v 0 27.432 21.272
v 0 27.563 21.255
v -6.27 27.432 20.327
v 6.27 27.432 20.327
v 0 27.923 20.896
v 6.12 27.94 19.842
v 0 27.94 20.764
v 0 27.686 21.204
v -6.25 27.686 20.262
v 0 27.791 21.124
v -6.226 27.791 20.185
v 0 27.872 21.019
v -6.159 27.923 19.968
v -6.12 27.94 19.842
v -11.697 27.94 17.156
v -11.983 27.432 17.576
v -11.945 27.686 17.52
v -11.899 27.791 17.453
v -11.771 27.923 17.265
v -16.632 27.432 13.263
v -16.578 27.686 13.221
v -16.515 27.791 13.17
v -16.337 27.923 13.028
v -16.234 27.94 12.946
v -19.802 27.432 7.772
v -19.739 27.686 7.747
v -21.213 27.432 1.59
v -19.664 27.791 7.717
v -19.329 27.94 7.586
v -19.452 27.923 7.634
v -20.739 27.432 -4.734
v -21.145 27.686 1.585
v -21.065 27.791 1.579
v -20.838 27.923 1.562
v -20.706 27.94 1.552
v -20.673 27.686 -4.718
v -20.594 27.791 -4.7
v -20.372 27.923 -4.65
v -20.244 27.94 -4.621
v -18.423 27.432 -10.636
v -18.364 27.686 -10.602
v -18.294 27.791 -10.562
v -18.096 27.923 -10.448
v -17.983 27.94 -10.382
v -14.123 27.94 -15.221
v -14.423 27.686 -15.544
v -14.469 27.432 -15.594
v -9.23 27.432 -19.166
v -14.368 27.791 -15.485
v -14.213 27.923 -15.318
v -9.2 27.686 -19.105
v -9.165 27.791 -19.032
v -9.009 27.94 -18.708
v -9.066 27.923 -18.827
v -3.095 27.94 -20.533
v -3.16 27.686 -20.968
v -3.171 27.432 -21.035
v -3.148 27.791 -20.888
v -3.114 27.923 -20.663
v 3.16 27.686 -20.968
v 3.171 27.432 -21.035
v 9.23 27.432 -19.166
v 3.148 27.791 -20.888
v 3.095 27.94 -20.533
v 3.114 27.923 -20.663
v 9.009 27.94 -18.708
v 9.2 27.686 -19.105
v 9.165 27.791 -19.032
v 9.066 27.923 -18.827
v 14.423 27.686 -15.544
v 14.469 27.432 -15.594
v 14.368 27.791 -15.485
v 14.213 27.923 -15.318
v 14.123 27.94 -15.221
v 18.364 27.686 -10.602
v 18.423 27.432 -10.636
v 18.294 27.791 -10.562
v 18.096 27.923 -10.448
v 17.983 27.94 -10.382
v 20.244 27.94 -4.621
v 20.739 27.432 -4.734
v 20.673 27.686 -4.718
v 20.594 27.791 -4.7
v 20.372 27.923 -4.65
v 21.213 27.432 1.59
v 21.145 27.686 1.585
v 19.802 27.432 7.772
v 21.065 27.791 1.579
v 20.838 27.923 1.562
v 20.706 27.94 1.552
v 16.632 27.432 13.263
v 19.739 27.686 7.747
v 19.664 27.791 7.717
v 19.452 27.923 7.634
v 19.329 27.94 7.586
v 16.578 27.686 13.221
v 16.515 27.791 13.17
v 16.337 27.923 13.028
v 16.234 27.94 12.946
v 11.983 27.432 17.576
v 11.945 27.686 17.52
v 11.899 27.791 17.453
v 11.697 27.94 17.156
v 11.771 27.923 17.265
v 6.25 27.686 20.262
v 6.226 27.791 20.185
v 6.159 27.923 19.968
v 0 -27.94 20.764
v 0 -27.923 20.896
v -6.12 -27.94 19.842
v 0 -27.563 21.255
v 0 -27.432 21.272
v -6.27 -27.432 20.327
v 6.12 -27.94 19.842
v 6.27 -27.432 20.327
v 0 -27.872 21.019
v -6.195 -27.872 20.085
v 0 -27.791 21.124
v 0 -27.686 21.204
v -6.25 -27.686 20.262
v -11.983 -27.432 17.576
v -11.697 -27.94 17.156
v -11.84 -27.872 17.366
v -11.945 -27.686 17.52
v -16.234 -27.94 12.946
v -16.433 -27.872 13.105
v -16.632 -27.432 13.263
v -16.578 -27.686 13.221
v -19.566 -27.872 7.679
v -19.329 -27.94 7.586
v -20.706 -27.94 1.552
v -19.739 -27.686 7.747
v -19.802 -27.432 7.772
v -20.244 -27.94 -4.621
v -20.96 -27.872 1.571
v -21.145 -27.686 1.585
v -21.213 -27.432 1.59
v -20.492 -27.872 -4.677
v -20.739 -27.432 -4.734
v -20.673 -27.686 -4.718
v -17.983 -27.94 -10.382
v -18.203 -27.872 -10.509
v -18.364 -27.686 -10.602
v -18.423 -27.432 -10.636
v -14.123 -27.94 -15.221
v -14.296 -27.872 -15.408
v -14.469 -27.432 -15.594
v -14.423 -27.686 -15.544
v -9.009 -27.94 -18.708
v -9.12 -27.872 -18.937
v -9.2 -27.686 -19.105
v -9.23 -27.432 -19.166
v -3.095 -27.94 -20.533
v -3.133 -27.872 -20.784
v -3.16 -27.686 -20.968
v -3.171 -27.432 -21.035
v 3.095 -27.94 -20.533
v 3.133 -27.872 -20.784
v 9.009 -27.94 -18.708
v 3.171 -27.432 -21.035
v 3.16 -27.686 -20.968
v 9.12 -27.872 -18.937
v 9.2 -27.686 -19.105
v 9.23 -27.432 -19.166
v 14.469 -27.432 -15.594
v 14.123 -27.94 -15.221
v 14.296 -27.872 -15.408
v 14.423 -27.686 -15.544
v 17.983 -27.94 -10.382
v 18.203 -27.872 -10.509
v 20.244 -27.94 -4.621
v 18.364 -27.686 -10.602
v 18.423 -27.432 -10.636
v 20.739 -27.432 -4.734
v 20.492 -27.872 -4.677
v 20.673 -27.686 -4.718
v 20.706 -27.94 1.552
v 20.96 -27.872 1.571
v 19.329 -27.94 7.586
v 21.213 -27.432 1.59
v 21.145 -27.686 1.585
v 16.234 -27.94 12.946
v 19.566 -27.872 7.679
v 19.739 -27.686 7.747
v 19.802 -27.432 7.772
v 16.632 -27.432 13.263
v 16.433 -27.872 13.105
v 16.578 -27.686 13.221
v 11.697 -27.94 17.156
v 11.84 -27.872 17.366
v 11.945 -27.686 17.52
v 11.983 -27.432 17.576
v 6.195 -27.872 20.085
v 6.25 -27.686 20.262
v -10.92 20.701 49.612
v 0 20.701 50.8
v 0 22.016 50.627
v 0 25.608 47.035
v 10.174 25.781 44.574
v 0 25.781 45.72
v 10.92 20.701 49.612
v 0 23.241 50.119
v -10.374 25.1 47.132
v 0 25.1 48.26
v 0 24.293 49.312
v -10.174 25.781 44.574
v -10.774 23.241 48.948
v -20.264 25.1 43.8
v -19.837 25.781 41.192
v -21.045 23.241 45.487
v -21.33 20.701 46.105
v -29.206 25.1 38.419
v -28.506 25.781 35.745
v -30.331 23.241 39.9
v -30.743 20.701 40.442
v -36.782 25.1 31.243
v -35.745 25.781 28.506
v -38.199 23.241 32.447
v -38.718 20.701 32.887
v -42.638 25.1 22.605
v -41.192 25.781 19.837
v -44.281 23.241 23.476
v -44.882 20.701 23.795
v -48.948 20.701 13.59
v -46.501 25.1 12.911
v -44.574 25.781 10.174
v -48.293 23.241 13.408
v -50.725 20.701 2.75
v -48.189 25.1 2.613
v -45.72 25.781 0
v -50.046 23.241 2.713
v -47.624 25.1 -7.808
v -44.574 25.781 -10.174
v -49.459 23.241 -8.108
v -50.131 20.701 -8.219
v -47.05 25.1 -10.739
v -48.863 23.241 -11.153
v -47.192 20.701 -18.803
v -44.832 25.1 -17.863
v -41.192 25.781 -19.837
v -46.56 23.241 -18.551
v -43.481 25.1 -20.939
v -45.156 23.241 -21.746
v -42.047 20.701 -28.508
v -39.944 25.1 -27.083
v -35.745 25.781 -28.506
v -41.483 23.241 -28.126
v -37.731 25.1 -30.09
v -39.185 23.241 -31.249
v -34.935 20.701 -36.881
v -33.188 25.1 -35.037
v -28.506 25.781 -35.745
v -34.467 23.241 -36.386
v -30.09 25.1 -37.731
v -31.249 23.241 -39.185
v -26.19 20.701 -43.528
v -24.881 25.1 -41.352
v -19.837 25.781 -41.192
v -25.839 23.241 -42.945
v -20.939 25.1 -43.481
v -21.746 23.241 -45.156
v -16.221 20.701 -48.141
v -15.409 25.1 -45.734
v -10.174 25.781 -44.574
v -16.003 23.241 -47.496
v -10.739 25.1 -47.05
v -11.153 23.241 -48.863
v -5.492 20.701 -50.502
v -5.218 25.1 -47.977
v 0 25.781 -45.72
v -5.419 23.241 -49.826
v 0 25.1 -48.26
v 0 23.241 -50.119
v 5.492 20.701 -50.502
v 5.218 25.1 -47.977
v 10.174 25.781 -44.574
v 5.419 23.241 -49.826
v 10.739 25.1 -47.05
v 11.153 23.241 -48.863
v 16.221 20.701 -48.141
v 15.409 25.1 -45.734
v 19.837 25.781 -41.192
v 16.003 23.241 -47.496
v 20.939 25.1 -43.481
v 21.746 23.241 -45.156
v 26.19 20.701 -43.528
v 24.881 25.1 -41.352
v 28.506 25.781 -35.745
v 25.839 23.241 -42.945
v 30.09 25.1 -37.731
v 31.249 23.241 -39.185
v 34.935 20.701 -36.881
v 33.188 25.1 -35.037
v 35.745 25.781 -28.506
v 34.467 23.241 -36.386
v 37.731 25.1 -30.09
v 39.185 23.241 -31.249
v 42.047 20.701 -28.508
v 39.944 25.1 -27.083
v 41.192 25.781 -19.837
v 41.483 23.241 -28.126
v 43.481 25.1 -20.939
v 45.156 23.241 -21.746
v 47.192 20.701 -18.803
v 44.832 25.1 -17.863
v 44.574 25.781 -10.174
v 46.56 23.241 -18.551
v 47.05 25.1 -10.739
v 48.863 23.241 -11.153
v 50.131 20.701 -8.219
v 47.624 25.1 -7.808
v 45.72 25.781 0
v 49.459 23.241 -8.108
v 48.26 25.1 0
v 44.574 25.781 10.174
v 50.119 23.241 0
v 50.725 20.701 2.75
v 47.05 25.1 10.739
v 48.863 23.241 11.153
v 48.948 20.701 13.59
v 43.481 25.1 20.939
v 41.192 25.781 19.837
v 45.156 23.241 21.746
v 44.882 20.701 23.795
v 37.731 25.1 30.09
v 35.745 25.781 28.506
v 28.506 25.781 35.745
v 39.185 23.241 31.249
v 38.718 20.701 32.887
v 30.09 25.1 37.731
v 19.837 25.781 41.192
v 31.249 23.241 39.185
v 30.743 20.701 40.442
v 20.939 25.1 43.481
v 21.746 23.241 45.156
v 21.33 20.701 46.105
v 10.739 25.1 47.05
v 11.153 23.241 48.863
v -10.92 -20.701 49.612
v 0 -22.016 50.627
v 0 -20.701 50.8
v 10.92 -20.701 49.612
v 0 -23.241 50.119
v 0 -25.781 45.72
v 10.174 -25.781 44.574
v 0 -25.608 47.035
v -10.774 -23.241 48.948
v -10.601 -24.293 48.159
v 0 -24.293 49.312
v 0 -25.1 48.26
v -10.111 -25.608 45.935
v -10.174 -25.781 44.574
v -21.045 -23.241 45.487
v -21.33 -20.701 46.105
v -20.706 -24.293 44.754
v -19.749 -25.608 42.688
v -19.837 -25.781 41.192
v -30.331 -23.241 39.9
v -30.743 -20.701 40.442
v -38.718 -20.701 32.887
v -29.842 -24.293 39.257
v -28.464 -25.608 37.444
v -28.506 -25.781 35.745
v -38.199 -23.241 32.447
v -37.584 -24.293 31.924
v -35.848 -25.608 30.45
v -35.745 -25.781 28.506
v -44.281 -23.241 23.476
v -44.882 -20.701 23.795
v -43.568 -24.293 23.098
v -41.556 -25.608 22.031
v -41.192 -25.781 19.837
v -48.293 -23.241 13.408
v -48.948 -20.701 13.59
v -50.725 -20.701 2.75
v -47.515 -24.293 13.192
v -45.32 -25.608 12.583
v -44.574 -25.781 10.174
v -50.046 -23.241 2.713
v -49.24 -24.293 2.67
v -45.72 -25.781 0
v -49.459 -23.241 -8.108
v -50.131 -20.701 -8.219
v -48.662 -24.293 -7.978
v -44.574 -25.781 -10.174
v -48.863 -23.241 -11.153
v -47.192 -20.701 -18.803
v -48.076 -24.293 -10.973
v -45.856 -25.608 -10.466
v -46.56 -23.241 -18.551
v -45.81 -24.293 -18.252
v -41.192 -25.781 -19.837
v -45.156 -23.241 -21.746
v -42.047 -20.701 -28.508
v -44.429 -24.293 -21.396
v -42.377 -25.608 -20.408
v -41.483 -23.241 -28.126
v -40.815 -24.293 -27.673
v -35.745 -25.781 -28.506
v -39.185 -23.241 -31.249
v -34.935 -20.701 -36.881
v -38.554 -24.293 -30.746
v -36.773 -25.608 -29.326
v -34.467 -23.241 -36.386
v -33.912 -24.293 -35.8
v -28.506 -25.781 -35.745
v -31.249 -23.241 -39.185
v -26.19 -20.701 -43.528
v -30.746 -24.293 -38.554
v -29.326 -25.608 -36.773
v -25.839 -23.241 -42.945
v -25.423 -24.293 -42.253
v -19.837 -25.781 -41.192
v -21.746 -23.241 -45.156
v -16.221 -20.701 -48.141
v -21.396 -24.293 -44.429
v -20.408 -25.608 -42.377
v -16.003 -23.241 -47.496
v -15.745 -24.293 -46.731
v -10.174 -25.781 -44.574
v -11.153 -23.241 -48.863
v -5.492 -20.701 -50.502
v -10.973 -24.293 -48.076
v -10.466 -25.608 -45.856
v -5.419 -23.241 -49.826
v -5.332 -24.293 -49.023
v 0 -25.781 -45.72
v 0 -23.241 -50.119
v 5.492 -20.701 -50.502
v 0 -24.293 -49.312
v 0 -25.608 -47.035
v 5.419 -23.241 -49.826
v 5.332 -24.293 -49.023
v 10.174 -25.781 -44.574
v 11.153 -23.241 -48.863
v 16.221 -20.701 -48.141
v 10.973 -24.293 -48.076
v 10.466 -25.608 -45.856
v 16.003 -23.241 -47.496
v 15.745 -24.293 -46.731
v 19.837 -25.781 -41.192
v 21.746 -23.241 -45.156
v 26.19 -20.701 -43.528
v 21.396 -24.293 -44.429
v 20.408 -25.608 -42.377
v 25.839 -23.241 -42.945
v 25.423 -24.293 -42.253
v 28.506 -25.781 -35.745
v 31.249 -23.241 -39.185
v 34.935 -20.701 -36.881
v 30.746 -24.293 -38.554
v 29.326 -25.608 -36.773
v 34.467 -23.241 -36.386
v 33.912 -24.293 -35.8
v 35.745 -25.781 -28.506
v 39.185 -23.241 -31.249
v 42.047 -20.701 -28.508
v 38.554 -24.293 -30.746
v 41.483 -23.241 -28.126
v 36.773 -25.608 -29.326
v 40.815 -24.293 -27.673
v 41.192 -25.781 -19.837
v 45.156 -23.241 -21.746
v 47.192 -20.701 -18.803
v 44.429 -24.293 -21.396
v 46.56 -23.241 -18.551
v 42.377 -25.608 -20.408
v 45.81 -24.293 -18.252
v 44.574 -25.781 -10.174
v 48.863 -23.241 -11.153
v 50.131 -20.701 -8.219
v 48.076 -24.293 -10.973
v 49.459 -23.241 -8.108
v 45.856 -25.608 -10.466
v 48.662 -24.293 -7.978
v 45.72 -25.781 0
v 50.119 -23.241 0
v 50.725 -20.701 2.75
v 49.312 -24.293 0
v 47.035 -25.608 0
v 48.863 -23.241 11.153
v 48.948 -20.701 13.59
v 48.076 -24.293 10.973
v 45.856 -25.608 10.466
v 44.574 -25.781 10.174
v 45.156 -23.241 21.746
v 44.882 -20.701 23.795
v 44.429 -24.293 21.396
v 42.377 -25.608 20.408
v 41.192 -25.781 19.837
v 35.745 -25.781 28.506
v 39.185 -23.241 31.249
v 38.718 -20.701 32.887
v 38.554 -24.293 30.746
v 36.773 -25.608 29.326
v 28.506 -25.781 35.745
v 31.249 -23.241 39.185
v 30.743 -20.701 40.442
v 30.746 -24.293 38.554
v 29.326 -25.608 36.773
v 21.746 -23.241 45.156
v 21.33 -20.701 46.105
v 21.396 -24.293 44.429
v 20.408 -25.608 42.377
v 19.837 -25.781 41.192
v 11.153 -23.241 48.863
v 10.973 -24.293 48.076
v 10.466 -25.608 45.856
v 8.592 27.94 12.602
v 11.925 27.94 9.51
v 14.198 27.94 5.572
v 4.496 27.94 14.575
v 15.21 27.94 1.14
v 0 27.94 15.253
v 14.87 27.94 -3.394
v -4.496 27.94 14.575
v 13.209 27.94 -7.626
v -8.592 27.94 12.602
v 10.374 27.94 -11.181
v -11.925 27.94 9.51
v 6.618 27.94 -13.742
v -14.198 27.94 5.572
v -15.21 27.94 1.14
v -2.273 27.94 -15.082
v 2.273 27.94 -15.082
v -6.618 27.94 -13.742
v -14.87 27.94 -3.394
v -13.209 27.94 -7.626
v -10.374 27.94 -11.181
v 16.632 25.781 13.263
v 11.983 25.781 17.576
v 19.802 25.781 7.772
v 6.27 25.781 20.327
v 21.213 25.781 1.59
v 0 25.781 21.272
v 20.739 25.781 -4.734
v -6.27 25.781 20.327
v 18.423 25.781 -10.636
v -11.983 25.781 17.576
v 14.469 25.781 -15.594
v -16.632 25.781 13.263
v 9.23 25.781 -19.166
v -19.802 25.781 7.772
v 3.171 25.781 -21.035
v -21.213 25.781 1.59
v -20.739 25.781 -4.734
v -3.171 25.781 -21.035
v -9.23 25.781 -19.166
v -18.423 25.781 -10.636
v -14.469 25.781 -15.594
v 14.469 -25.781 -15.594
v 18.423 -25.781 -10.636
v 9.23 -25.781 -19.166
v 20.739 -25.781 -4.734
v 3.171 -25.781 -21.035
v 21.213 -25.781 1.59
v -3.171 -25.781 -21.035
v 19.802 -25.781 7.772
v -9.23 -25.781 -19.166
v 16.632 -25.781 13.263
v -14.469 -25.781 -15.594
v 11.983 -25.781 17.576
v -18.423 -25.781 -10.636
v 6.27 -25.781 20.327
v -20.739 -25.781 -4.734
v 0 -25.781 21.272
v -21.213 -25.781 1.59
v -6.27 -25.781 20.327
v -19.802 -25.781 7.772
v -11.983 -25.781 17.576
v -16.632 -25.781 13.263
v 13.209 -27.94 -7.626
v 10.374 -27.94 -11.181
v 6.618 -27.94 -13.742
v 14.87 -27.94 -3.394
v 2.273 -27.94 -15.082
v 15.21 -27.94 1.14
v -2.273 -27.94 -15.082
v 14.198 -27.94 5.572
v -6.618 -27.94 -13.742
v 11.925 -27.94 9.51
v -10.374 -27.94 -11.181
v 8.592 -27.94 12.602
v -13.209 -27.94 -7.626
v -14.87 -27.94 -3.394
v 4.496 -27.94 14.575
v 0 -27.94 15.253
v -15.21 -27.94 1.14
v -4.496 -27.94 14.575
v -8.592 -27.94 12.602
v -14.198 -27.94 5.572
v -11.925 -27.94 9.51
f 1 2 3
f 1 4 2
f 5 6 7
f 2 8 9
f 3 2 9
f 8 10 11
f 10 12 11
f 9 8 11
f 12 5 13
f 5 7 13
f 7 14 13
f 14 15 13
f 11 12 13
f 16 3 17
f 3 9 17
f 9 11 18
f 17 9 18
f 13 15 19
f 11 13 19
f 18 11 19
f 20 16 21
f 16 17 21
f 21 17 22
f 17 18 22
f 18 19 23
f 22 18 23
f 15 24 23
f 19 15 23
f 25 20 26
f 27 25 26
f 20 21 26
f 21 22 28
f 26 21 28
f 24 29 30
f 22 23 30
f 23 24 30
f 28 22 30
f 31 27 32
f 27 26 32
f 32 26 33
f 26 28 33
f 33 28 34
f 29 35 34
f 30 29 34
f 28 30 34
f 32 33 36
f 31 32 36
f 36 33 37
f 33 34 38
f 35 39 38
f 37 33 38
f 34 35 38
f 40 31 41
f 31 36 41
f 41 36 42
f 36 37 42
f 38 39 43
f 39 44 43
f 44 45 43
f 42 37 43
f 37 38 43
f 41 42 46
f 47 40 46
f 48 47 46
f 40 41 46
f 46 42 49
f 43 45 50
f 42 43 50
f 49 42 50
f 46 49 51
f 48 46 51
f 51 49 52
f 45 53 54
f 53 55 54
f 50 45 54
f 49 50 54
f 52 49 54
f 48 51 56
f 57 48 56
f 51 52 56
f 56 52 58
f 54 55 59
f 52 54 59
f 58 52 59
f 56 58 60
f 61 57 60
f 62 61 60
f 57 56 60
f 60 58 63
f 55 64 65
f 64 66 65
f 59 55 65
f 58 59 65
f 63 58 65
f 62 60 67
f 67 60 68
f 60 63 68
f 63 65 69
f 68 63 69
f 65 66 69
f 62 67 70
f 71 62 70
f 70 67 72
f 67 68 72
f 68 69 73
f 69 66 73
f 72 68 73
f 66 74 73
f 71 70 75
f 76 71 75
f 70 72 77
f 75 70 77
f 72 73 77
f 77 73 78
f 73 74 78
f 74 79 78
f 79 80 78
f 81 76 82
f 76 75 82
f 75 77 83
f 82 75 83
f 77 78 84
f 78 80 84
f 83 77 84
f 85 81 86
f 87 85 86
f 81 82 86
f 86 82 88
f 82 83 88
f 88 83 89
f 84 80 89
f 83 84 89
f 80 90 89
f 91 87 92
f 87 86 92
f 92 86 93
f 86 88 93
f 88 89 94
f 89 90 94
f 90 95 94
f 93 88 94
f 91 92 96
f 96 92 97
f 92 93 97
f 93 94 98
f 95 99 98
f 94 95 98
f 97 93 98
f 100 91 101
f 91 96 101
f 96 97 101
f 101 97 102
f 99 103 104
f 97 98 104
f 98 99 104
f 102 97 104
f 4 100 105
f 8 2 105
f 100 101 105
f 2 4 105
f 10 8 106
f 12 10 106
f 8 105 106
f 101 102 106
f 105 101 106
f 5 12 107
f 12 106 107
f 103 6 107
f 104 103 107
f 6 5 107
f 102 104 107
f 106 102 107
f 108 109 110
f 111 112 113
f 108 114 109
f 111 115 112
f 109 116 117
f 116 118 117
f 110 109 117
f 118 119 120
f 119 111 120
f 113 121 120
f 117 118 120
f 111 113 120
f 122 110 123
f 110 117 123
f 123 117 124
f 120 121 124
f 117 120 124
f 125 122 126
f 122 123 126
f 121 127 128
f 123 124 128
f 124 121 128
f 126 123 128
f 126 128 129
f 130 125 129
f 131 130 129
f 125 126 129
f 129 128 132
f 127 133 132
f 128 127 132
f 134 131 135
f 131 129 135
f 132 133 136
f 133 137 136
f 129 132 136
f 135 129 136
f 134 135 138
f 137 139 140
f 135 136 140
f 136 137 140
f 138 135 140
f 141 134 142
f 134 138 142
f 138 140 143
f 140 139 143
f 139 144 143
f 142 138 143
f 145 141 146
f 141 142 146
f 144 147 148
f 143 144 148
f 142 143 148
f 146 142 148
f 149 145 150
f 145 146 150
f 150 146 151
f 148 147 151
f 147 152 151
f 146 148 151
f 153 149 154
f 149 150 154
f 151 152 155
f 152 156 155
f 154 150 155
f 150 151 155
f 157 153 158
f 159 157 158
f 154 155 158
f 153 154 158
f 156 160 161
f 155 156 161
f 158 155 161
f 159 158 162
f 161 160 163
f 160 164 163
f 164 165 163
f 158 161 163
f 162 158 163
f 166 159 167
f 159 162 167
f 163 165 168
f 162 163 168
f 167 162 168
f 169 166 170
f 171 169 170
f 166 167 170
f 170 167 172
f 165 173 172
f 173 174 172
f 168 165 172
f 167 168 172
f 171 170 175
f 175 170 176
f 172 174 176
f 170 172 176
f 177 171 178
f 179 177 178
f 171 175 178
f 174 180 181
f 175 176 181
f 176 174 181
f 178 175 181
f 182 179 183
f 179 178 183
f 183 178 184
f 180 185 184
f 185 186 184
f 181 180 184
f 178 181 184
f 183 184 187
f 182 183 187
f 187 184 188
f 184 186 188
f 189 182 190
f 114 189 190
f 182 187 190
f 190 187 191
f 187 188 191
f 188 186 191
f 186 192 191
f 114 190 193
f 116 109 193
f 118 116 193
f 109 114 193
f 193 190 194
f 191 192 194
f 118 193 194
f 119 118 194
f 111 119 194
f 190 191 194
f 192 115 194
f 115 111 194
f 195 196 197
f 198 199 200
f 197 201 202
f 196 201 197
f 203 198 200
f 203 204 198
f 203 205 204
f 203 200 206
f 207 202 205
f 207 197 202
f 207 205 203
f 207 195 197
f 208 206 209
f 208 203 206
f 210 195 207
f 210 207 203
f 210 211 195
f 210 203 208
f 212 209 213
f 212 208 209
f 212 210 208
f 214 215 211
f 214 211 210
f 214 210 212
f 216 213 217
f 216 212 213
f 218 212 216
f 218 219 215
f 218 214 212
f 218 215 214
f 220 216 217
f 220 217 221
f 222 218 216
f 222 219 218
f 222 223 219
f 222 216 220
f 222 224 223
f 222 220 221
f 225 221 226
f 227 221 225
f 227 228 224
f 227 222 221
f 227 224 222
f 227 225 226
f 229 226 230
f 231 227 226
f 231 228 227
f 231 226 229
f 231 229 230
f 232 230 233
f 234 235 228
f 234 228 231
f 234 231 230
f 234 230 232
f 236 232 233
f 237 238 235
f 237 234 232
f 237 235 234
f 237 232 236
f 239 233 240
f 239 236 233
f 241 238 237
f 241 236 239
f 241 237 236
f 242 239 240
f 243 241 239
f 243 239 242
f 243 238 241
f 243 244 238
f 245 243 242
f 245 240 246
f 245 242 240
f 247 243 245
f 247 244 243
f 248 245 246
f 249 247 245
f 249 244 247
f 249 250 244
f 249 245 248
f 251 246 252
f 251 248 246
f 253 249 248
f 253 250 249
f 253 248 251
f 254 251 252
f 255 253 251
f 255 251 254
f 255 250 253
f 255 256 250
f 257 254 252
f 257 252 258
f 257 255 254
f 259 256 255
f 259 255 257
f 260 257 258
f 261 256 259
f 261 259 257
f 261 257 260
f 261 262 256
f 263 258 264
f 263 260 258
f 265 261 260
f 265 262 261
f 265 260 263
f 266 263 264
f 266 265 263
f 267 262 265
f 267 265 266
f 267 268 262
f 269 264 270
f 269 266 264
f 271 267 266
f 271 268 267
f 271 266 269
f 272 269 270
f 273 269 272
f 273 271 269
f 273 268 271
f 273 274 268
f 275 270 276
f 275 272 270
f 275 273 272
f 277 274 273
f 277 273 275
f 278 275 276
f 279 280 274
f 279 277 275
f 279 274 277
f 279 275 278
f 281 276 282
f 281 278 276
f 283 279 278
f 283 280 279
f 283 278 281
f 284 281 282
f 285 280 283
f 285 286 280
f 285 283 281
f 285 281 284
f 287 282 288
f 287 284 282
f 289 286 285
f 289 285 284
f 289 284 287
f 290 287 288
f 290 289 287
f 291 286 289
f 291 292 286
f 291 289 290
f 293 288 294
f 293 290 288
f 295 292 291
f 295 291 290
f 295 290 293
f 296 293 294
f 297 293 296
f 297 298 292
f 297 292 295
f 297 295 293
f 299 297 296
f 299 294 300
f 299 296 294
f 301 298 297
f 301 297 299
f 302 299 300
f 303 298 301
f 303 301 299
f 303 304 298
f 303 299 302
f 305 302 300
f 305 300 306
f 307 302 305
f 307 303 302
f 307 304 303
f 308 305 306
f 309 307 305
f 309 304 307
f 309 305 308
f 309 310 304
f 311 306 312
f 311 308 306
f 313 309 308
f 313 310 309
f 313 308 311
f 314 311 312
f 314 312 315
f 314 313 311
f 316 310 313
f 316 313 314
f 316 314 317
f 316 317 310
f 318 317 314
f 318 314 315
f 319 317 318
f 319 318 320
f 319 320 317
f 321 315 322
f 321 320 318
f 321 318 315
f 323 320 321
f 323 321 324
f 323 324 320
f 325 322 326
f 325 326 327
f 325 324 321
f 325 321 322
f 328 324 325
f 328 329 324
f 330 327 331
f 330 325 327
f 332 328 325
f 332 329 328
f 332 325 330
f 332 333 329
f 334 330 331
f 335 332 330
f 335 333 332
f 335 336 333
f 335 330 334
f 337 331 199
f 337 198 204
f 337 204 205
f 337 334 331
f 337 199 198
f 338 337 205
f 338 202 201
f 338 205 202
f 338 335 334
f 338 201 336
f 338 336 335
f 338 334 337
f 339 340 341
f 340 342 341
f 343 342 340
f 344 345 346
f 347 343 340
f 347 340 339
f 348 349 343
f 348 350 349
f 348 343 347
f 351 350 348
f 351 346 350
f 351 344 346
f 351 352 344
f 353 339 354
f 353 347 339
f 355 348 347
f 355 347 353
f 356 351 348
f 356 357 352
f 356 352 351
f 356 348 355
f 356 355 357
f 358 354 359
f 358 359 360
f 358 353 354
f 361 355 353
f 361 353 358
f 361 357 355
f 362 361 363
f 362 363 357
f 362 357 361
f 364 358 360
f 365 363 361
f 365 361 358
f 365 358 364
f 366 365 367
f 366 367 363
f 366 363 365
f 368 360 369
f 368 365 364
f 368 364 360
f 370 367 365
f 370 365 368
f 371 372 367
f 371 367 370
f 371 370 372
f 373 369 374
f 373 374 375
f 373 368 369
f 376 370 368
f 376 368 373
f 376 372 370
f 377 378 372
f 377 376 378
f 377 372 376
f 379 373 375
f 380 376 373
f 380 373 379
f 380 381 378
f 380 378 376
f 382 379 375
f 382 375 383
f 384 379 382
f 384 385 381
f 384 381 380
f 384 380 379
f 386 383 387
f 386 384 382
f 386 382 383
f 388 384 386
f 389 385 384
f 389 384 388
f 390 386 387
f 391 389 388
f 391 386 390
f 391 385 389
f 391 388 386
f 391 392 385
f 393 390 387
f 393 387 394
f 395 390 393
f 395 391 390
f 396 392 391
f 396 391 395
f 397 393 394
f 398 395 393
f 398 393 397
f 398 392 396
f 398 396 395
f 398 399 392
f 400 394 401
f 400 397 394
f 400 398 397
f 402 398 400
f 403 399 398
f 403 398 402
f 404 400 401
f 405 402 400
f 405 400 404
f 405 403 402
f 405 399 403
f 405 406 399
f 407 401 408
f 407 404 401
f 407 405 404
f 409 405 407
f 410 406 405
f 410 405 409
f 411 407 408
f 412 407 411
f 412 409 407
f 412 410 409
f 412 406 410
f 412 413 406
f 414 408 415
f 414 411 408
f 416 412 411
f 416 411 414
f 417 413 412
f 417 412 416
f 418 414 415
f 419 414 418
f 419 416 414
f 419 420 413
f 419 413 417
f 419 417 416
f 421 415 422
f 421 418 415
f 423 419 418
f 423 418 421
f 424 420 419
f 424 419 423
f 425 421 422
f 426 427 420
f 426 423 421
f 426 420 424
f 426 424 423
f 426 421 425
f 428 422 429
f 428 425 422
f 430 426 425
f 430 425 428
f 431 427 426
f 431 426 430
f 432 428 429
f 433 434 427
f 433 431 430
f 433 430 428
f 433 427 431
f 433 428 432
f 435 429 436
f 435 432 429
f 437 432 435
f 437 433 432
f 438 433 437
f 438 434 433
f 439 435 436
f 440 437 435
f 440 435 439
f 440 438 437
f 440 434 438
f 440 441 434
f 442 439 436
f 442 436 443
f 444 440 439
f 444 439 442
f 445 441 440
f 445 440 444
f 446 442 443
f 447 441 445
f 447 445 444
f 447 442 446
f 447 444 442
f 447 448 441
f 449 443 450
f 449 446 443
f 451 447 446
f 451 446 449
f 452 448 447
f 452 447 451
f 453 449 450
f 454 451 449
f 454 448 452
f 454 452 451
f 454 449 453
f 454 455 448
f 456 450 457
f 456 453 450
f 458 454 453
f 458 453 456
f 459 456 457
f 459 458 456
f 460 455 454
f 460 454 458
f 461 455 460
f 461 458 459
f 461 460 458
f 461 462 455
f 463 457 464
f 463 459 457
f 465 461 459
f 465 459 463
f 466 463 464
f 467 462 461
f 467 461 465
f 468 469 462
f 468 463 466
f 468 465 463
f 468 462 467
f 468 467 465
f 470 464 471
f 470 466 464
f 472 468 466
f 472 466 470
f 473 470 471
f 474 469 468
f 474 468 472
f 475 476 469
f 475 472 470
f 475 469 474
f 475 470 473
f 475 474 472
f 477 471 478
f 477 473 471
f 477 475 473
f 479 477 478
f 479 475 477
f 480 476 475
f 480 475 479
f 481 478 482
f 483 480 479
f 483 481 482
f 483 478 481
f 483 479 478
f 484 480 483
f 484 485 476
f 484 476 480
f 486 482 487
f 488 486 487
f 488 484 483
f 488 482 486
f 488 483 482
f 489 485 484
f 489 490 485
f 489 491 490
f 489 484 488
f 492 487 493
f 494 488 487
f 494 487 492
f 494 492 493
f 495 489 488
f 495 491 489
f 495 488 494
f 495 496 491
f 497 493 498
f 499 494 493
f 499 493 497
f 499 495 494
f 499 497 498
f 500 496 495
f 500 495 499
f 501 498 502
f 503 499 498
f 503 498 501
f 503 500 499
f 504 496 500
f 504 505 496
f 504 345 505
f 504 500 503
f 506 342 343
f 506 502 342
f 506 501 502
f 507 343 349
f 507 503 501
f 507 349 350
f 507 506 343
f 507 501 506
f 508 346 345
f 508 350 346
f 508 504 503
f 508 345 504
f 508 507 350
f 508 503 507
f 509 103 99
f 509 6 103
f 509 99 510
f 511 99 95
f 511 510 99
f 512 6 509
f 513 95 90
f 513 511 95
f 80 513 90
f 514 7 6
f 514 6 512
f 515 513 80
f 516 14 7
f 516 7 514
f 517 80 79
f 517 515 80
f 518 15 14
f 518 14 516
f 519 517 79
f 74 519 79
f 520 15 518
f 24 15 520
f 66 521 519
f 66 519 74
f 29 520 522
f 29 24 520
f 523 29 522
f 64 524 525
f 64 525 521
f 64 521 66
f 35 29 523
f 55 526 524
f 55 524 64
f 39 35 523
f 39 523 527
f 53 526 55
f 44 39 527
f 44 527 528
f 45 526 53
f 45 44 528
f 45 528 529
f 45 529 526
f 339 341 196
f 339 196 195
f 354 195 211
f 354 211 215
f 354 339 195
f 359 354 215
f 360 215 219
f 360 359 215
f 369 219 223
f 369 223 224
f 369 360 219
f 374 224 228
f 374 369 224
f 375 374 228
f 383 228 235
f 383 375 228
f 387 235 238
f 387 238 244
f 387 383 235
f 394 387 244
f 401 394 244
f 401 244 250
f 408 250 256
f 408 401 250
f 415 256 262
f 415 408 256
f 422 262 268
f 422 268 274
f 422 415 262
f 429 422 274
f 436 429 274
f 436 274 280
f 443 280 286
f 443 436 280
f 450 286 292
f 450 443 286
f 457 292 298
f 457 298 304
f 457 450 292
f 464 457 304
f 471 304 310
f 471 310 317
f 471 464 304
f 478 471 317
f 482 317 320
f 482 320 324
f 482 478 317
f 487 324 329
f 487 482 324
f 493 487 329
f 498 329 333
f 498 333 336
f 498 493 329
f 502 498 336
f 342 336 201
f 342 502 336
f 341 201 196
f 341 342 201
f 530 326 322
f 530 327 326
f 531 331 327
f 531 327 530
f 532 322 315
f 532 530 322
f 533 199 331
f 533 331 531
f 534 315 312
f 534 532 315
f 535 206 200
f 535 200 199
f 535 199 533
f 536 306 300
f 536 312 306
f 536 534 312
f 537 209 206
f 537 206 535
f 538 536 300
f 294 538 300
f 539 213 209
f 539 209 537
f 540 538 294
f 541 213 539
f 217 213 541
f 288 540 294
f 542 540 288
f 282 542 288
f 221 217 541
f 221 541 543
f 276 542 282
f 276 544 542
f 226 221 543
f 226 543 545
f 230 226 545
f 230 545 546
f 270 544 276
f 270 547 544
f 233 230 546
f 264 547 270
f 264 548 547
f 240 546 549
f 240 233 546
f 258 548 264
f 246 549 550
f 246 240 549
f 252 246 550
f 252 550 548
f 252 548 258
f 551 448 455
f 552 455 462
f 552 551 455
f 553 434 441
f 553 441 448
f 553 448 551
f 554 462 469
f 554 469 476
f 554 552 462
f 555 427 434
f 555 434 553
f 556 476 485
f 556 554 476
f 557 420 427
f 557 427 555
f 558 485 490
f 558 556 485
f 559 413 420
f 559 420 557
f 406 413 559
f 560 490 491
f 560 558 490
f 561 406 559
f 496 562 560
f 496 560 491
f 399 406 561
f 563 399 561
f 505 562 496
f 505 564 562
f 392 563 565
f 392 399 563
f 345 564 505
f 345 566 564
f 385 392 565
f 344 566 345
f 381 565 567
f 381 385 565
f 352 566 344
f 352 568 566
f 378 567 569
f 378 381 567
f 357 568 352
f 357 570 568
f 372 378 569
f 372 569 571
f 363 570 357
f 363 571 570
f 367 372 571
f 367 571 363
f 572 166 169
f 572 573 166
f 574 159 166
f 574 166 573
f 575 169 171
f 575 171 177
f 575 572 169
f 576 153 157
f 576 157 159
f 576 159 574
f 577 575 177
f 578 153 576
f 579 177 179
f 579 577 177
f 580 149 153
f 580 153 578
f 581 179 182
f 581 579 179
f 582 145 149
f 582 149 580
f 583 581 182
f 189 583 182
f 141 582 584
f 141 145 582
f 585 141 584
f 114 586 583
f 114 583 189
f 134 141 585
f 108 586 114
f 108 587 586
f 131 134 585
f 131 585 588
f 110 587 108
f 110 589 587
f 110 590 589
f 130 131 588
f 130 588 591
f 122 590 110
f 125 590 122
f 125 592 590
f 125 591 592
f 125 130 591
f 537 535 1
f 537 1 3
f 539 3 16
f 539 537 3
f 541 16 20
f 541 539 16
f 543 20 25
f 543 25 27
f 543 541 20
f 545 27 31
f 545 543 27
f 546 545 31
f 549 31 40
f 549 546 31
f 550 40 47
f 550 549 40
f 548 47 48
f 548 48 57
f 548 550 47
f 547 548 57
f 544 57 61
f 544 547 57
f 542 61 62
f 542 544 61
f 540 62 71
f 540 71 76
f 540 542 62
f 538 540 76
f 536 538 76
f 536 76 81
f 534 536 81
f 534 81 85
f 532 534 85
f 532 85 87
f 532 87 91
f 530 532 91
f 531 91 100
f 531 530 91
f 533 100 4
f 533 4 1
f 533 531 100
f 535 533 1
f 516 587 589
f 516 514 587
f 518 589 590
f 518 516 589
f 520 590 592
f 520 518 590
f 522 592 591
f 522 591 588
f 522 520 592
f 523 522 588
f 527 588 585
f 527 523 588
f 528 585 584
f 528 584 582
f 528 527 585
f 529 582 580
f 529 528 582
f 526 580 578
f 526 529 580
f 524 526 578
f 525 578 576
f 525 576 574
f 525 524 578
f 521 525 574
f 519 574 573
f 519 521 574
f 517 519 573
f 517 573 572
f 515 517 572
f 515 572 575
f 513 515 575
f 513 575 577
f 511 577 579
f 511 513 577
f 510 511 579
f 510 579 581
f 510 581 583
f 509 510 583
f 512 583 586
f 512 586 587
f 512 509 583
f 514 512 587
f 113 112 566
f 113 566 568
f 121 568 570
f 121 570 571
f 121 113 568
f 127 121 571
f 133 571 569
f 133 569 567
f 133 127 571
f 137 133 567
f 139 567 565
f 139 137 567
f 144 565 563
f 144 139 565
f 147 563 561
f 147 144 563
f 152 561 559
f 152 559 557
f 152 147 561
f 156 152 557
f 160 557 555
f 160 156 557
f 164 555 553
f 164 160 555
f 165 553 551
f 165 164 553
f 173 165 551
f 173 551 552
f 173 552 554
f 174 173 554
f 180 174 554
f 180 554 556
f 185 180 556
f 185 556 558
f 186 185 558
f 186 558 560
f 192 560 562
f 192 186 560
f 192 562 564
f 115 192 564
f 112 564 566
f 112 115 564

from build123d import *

# Parameters (mm, degrees)
FILLET1_R = 5.08
FILLET2_R = 0.508


with BuildPart() as part:
    # Sketch1 → Revolve1 (revolve)
    with BuildSketch(Plane(origin=(0, 0, 0), x_dir=(0, 0, -1), z_dir=(1, 0, 0)), mode=Mode.PRIVATE) as revolve1_sk:
        Polygon((21.2725, -25.781), (21.2725, -27.94), (15.2527, -27.94), (15.2527, 27.94), (21.2725, 27.94), (21.2725, 25.781), (50.8, 25.781), (50.8, -25.781), align=None)
    revolve(revolve1_sk.sketch.rotate(Axis((0, 25.781, 0), (0, -1, 0)), 180), axis=Axis((0, 25.781, 0), (0, -1, 0)))

    # Fillet1
    fillet1_edges = [part.edges().sort_by_distance(p)[0] for p in [
        (0, -25.781, -50.8),
        (0, 25.781, -50.8),
    ]]
    fillet(fillet1_edges, radius=FILLET1_R)

    # Fillet2
    fillet2_edges = [part.edges().sort_by_distance(p)[0] for p in [
        (0, -27.94, -21.2725),
        (0, 27.94, -21.2725),
    ]]
    fillet(fillet2_edges, radius=FILLET2_R)


solid = part.part
